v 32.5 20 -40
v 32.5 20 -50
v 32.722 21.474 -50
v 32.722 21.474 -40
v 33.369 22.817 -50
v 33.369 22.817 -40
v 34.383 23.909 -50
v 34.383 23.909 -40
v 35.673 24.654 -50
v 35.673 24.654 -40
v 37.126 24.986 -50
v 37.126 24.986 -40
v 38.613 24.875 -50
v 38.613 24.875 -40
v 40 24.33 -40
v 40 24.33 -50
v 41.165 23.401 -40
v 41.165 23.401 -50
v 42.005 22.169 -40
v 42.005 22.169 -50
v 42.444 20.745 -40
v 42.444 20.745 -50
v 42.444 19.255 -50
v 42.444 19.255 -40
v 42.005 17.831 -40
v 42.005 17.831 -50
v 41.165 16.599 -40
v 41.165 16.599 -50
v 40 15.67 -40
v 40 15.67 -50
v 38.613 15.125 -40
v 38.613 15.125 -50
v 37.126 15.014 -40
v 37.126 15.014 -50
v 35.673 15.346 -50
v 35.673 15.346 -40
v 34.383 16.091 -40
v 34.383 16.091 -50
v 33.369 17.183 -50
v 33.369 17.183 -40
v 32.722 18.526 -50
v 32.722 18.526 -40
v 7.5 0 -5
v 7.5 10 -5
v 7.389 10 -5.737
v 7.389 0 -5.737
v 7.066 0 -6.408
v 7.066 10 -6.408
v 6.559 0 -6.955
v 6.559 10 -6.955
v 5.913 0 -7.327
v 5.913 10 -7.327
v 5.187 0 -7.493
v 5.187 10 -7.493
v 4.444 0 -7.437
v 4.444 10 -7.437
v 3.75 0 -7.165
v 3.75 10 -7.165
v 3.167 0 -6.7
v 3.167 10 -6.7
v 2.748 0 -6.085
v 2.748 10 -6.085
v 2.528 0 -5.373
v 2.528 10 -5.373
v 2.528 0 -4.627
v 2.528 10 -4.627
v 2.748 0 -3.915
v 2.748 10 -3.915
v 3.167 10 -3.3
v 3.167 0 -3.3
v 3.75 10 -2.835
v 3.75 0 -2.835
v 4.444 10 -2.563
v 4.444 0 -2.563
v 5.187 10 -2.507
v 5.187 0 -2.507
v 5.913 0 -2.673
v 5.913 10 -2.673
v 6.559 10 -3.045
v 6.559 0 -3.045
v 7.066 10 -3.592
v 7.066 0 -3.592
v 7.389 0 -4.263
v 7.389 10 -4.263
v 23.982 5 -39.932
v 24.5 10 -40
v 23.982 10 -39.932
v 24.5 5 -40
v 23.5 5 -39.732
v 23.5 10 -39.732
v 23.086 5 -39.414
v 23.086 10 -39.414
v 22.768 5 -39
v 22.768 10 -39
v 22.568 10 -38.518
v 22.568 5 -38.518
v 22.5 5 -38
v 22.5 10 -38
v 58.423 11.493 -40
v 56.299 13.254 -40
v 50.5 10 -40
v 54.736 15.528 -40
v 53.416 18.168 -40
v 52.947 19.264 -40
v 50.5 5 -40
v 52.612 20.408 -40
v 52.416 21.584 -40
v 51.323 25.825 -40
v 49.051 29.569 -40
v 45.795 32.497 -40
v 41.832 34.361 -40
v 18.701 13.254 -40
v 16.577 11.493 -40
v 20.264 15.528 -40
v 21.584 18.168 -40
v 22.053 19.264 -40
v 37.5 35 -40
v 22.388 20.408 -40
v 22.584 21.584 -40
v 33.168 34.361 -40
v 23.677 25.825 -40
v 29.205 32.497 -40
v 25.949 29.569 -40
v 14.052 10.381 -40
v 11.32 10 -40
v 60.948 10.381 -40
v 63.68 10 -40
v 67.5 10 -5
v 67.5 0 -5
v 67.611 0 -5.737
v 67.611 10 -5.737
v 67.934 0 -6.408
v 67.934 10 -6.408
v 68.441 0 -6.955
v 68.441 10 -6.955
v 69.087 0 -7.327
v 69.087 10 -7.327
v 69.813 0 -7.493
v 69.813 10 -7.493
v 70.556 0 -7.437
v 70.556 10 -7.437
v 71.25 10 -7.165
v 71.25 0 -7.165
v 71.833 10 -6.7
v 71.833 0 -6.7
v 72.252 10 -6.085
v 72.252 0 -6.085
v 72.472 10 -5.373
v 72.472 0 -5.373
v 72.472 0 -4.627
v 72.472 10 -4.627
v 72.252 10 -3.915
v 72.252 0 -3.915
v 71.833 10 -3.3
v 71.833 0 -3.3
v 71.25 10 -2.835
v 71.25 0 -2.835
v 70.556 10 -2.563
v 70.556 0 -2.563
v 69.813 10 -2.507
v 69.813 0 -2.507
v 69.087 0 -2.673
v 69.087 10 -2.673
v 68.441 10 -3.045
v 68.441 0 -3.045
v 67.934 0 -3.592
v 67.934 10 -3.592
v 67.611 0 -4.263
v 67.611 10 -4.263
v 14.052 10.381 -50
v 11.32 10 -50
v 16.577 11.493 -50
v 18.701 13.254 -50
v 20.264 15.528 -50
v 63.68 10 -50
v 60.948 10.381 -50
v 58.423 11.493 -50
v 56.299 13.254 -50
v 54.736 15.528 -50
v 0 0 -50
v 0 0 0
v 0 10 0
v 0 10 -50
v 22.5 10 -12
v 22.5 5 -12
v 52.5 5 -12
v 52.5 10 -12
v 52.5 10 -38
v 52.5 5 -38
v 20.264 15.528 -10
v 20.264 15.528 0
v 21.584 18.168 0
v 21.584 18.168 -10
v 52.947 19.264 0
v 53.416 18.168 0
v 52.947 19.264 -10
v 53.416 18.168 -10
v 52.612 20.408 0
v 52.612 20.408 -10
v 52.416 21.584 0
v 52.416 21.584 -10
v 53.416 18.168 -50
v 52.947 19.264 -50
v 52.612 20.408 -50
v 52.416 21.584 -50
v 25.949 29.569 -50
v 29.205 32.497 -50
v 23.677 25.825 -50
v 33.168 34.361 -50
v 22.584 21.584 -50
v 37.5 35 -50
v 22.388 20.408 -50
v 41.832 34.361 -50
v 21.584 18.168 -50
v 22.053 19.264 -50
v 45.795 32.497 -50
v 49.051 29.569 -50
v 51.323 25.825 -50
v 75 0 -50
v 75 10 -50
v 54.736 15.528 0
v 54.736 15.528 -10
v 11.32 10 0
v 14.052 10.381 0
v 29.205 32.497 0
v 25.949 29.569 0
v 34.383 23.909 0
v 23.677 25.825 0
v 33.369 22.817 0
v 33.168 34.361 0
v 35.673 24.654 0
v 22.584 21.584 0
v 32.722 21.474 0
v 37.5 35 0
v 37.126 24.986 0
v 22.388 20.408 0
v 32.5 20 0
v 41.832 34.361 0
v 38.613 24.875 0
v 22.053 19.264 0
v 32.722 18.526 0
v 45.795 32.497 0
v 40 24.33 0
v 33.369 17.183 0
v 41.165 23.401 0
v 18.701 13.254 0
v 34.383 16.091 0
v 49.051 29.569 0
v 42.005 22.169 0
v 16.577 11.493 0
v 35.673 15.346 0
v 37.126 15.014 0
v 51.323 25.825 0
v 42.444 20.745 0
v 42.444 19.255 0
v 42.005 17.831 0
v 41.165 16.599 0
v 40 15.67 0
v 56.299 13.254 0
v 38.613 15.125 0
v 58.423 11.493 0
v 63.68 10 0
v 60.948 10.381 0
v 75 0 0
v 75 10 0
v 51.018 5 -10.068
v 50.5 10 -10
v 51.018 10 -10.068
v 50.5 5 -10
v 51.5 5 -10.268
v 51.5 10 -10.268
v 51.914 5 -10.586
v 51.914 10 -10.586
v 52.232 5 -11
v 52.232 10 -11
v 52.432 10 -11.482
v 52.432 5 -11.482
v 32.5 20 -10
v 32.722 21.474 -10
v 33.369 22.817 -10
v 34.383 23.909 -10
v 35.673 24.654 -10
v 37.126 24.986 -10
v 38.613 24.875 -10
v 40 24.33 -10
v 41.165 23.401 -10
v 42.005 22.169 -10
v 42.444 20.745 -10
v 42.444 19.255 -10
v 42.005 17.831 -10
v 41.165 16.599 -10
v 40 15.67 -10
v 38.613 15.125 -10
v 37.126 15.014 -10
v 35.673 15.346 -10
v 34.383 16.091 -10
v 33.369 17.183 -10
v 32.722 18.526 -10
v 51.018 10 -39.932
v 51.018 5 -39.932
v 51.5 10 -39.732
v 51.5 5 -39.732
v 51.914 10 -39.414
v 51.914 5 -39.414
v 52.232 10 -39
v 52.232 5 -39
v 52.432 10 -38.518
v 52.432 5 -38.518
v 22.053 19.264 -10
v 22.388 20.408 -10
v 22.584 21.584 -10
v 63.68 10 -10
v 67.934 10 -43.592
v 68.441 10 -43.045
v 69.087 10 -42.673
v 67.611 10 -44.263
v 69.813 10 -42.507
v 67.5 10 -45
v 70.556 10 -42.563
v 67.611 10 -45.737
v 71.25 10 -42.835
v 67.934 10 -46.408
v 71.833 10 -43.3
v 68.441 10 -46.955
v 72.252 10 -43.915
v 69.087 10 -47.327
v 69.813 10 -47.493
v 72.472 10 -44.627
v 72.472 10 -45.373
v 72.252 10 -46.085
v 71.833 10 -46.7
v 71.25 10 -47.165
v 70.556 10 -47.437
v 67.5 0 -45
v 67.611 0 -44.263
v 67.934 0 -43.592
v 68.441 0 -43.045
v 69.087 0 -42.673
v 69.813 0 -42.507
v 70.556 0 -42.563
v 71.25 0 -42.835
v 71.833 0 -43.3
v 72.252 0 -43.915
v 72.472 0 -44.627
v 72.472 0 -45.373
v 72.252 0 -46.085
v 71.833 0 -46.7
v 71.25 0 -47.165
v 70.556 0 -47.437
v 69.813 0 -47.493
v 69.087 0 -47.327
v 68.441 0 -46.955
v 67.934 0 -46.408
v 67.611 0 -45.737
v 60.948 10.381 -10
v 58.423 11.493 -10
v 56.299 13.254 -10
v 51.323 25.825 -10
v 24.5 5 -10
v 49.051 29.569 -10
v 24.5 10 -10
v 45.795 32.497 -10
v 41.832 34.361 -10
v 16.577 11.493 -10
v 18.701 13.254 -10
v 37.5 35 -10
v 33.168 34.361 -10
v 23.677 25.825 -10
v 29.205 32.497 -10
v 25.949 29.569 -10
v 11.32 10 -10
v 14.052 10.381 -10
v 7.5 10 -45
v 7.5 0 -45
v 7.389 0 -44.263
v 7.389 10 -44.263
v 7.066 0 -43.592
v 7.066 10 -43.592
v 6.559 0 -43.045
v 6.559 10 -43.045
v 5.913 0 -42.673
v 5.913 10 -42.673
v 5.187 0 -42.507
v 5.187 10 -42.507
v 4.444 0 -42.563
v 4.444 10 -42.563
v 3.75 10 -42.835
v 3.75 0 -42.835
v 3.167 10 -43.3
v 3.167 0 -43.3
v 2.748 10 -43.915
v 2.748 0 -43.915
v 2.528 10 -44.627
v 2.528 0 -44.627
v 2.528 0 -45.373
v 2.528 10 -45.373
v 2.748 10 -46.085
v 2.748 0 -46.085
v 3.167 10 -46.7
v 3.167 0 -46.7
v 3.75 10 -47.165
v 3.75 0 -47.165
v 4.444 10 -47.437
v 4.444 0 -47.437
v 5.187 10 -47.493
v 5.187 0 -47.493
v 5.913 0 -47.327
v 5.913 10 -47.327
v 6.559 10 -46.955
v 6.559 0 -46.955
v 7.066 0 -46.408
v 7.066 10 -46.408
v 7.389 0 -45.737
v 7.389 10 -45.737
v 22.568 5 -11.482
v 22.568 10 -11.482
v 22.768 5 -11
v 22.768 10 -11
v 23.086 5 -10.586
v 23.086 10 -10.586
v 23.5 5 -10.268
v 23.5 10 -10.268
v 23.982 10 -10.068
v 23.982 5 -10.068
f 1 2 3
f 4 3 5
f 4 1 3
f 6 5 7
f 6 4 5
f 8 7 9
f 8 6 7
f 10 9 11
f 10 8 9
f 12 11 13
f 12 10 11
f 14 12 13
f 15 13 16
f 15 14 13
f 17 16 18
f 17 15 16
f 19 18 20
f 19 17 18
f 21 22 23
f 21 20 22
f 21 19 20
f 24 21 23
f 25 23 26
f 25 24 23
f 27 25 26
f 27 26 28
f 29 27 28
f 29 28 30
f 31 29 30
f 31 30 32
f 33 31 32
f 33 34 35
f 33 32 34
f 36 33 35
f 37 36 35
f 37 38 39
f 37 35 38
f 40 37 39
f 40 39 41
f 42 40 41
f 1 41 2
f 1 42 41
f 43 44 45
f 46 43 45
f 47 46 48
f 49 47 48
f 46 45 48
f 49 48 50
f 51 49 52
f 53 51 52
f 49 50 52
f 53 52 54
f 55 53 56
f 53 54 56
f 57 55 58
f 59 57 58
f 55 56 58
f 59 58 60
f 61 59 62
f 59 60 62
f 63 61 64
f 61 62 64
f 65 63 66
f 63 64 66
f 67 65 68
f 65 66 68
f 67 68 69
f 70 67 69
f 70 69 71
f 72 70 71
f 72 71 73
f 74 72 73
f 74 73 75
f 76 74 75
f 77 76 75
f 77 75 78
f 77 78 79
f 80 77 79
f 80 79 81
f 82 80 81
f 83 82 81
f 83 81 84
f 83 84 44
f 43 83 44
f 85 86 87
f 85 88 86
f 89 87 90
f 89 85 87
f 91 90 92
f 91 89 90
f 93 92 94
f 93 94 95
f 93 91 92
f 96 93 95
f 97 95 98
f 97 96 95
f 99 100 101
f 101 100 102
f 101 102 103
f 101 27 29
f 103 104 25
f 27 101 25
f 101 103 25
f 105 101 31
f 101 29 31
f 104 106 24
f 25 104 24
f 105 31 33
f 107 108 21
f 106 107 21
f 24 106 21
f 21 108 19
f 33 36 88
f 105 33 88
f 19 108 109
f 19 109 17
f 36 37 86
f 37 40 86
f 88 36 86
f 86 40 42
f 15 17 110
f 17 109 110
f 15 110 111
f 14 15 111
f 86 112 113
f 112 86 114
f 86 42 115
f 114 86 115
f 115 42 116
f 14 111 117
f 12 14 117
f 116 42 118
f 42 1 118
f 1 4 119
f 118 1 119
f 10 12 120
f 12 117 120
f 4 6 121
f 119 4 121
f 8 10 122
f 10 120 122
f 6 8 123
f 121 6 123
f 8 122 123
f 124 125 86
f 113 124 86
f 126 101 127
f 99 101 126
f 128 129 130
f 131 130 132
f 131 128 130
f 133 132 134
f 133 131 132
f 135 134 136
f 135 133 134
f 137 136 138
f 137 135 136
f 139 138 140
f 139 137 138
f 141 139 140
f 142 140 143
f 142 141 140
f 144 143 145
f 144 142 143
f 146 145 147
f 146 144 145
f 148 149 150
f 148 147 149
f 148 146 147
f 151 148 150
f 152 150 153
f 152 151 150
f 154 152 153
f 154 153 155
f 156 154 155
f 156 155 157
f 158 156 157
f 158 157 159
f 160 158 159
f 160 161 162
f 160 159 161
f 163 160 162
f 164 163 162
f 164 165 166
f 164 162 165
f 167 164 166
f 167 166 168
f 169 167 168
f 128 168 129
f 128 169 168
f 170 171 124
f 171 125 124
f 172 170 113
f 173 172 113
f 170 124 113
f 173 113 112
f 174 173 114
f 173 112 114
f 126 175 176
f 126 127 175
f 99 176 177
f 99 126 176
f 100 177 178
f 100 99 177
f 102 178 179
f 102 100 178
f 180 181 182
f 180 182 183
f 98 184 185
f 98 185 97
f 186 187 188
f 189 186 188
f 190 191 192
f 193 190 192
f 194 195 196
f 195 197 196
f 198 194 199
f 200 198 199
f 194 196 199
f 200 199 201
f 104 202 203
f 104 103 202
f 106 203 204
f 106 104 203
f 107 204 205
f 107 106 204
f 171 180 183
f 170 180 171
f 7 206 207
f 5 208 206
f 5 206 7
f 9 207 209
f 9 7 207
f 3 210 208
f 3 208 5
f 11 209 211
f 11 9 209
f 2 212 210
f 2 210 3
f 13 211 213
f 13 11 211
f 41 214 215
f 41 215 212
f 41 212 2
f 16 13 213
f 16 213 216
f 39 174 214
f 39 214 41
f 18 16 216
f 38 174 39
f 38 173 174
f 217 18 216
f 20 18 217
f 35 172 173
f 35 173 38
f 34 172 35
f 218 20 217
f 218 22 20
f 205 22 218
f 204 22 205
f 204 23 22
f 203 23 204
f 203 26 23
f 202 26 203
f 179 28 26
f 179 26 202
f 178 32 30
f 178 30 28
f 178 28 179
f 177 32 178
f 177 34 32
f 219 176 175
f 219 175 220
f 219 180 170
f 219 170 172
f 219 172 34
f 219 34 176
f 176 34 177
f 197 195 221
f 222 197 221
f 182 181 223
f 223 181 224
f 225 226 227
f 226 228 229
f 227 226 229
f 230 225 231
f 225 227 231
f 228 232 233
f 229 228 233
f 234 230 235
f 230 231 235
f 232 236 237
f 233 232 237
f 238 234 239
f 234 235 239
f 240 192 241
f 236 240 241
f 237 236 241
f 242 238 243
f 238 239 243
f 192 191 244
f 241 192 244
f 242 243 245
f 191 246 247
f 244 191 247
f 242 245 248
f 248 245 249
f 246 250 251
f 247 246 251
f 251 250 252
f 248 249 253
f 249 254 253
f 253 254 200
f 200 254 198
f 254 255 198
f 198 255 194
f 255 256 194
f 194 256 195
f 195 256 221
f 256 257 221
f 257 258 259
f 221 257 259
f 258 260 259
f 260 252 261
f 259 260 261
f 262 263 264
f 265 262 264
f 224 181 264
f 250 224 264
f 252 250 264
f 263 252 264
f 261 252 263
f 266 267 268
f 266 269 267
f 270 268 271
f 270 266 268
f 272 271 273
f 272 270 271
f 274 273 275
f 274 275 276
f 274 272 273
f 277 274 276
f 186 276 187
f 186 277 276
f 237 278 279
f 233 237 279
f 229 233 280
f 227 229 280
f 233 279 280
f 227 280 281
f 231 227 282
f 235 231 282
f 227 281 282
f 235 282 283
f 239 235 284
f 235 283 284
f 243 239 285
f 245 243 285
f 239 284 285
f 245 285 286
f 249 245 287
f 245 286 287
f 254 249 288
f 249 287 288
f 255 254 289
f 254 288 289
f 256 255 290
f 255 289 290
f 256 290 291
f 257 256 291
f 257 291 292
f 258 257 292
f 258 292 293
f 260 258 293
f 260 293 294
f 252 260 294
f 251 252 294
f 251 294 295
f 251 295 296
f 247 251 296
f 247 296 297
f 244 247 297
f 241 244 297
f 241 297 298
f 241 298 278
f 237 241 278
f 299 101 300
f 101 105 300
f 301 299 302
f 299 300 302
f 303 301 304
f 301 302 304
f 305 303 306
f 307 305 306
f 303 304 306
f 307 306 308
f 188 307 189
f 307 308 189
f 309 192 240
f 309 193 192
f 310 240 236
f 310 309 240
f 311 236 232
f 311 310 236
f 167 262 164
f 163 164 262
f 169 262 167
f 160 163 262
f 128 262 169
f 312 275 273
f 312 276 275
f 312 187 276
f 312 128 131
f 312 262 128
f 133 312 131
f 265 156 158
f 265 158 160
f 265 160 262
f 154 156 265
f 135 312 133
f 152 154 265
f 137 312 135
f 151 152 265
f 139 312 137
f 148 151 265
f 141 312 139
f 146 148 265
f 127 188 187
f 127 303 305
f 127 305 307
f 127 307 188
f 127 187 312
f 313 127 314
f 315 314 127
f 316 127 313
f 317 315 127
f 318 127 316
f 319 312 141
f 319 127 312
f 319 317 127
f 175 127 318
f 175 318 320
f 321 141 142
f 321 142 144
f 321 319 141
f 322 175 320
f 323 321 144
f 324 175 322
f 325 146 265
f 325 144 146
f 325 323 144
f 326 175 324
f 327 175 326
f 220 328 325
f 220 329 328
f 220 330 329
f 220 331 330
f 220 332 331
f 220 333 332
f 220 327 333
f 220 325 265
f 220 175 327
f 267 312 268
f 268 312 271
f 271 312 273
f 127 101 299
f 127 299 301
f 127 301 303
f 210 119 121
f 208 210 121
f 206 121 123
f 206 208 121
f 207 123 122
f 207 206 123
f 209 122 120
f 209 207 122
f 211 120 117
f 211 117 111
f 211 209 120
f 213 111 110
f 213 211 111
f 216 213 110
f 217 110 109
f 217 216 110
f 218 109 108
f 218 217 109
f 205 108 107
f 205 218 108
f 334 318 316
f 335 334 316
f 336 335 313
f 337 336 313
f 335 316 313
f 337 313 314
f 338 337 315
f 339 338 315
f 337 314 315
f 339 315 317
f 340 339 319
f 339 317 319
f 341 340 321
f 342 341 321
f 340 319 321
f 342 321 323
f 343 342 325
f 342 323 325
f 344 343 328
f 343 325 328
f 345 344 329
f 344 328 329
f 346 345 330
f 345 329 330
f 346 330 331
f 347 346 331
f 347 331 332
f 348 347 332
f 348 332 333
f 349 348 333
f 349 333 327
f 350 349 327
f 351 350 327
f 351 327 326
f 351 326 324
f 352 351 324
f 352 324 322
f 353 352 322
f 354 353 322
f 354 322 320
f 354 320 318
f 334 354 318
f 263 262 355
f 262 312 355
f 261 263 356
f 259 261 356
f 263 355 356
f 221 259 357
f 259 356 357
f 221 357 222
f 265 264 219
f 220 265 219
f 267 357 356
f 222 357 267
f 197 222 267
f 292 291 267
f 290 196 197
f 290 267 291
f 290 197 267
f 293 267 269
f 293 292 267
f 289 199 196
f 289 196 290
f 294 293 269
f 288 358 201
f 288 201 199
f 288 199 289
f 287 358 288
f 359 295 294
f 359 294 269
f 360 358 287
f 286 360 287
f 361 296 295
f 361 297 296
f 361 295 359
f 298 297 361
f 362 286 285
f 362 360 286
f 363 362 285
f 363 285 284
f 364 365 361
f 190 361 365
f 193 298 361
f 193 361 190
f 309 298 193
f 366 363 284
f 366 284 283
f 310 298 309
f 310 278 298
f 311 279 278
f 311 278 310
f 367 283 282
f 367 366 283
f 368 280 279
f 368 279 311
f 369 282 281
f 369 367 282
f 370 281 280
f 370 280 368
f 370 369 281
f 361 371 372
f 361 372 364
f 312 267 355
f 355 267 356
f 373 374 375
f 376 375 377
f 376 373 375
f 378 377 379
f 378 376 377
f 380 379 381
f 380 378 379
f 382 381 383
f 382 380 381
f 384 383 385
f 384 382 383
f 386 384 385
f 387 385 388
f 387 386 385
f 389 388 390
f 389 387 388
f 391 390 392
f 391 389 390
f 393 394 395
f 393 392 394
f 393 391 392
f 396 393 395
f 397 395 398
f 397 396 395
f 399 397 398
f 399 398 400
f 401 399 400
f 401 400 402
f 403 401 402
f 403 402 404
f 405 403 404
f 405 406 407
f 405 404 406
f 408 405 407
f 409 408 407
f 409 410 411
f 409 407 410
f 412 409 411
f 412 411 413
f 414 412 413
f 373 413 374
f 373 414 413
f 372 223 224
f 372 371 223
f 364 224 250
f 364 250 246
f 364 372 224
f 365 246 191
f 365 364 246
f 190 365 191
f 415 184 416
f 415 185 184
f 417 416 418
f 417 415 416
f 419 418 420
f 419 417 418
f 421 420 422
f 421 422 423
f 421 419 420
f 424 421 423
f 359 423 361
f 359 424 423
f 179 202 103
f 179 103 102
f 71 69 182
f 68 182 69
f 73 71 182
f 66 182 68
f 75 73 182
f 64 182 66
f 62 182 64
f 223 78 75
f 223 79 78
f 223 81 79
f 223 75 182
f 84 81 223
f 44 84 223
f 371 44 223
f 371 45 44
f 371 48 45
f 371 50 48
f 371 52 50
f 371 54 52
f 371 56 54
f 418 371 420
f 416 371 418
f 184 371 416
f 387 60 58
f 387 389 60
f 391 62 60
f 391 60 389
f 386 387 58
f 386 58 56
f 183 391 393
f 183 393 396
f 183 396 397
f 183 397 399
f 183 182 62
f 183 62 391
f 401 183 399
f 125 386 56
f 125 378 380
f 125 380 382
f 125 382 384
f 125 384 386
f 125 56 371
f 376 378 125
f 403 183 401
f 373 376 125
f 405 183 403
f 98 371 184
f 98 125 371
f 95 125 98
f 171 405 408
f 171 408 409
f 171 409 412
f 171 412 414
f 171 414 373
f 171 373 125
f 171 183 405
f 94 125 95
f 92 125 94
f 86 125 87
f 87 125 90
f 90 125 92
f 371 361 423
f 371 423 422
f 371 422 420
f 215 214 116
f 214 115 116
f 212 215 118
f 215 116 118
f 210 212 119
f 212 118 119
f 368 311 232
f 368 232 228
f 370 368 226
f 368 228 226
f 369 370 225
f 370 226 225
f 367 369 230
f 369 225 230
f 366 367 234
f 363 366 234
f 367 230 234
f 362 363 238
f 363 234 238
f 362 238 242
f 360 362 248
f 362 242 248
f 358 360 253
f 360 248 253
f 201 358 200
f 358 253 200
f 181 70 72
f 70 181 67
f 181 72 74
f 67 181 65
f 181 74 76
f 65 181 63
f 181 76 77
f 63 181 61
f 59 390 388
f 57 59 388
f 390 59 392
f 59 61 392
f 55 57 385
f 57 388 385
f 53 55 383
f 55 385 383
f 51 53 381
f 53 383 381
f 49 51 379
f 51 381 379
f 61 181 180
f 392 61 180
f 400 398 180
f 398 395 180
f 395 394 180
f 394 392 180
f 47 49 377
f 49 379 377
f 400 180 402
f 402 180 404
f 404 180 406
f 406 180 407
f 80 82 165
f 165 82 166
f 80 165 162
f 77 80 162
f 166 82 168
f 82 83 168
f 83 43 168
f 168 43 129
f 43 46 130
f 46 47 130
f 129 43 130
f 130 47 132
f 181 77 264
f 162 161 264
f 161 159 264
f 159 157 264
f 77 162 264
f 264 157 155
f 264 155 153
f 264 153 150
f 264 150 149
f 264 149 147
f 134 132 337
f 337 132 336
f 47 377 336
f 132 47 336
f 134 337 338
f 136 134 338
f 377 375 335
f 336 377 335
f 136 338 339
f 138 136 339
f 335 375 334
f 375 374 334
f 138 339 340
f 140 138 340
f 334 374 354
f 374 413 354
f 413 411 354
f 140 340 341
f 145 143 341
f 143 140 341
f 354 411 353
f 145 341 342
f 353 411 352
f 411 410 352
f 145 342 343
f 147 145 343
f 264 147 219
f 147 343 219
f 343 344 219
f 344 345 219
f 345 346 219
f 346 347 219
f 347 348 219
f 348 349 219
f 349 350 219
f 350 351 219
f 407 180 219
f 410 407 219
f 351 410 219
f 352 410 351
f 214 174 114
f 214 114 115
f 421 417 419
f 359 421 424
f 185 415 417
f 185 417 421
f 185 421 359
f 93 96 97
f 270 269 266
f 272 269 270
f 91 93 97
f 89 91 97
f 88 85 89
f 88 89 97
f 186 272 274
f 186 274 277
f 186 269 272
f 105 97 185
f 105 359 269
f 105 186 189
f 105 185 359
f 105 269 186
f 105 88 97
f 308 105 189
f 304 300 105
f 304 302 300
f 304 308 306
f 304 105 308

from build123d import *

# Parameters (mm, degrees)
SKETCH1_W               = 75
SKETCH1_H               = 50
BOSS_EXTRUDE1_DEPTH     = 10
BOSS_EXTRUDE2_DEPTH     = 10
FILLET1_R               = 10
SKETCH4_R               = 5
CUT_EXTRUDE1_DEPTH      = 11
FILLET1_OF_MIRROR1_R    = 10
SKETCH5_R               = 2.5
CUT_EXTRUDE2_DEPTH      = 11
MIRROR3_COPY_1_SKETCH_R = 2.5
MIRROR3_COPY_1_DEPTH    = 11
SKETCH6_W               = 30
SKETCH6_H               = 30
CUT_EXTRUDE3_DEPTH      = 5
FILLET2_R               = 2


with BuildPart() as part:
    # Sketch1 → Boss-Extrude1 (new body)
    with BuildSketch(Plane(origin=(0, 0, 0), x_dir=(1, 0, 0), z_dir=(0, 1, 0))):
        with Locations((37.5, 25)):
            Rectangle(SKETCH1_W, SKETCH1_H)
    extrude(amount=BOSS_EXTRUDE1_DEPTH)

    # Sketch2 → Boss-Extrude2 (add)
    with BuildSketch(Plane.XY):
        with BuildLine():
            Line((52.5, 20), (57.5, 10))
            Line((57.5, 10), (17.5, 10))
            Line((17.5, 10), (22.5, 20))
            ThreePointArc((22.5, 20), (37.5, 35), (52.5, 20))
        make_face()
    boss_extrude2 = extrude(amount=-BOSS_EXTRUDE2_DEPTH)

    # Fillet1
    fillet1_edges = [part.edges().sort_by_distance(p)[0] for p in [
        (22.5, 20, -5),
        (52.5, 20, -5),
        (57.5, 10, -5),
        (17.5, 10, -5),
    ]]
    fillet(fillet1_edges, radius=FILLET1_R)

    # Sketch4 → Cut-Extrude1 (cut, through all)
    with BuildSketch(Plane(origin=(0, 0, -10), x_dir=(-1, 0, 0), z_dir=(0, 0, -1))):
        with Locations((-37.5, 20)):
            Circle(SKETCH4_R)
    cut_extrude1 = extrude(amount=-CUT_EXTRUDE1_DEPTH, mode=Mode.SUBTRACT)

    # Mirror1: Boss-Extrude2, Cut-Extrude1 across plane
    add(boss_extrude2.mirror(Plane(origin=(0, 0, -25), x_dir=(1, 0, 0), z_dir=(0, 0, -1))))
    add(cut_extrude1.mirror(Plane(origin=(0, 0, -25), x_dir=(1, 0, 0), z_dir=(0, 0, -1))), mode=Mode.SUBTRACT)

    # Fillet1 of Mirror1
    fillet1_of_mirror1_edges = [part.edges().sort_by_distance(p)[0] for p in [
        (22.5, 20, -45),
        (52.5, 20, -45),
        (57.5, 10, -45),
        (17.5, 10, -45),
    ]]
    fillet(fillet1_of_mirror1_edges, radius=FILLET1_OF_MIRROR1_R)

    # Sketch5 → Cut-Extrude2 (cut, through all)
    with BuildSketch(Plane(origin=(0, 10, 0), x_dir=(1, 0, 0), z_dir=(0, 1, 0))):
        with Locations((5, 5)):
            Circle(SKETCH5_R)
    cut_extrude2 = extrude(amount=-CUT_EXTRUDE2_DEPTH, mode=Mode.SUBTRACT)

    # Mirror2: Cut-Extrude2 across plane
    add(cut_extrude2.mirror(Plane(origin=(0, 0, -25), x_dir=(1, 0, 0), z_dir=(0, 0, -1))), mode=Mode.SUBTRACT)

    # Mirror3: Cut-Extrude2 across plane
    add(cut_extrude2.mirror(Plane(origin=(37.5, 0, 0), x_dir=(0, 0, 1), z_dir=(1, 0, 0))), mode=Mode.SUBTRACT)

    # Mirror3 copy 1 sketch → Mirror3 copy 1 (cut, through all)
    with BuildSketch(Plane(origin=(75, 10, -50), x_dir=(-1, 0, 0), z_dir=(0, 1, 0))):
        with Locations((5, 5)):
            Circle(MIRROR3_COPY_1_SKETCH_R)
    extrude(amount=-MIRROR3_COPY_1_DEPTH, mode=Mode.SUBTRACT)

    # Sketch6 → Cut-Extrude3 (cut)
    with BuildSketch(Plane(origin=(0, 10, 0), x_dir=(1, 0, 0), z_dir=(0, 1, 0))):
        with Locations((37.5, 25)):
            Rectangle(SKETCH6_W, SKETCH6_H)
    extrude(amount=-CUT_EXTRUDE3_DEPTH, mode=Mode.SUBTRACT)

    # Fillet2
    fillet2_edges = [part.edges().sort_by_distance(p)[0] for p in [
        (22.5, 7.5, -10),
        (22.5, 7.5, -40),
        (52.5, 7.5, -40),
        (52.5, 7.5, -10),
    ]]
    fillet(fillet2_edges, radius=FILLET2_R)


solid = part.part
